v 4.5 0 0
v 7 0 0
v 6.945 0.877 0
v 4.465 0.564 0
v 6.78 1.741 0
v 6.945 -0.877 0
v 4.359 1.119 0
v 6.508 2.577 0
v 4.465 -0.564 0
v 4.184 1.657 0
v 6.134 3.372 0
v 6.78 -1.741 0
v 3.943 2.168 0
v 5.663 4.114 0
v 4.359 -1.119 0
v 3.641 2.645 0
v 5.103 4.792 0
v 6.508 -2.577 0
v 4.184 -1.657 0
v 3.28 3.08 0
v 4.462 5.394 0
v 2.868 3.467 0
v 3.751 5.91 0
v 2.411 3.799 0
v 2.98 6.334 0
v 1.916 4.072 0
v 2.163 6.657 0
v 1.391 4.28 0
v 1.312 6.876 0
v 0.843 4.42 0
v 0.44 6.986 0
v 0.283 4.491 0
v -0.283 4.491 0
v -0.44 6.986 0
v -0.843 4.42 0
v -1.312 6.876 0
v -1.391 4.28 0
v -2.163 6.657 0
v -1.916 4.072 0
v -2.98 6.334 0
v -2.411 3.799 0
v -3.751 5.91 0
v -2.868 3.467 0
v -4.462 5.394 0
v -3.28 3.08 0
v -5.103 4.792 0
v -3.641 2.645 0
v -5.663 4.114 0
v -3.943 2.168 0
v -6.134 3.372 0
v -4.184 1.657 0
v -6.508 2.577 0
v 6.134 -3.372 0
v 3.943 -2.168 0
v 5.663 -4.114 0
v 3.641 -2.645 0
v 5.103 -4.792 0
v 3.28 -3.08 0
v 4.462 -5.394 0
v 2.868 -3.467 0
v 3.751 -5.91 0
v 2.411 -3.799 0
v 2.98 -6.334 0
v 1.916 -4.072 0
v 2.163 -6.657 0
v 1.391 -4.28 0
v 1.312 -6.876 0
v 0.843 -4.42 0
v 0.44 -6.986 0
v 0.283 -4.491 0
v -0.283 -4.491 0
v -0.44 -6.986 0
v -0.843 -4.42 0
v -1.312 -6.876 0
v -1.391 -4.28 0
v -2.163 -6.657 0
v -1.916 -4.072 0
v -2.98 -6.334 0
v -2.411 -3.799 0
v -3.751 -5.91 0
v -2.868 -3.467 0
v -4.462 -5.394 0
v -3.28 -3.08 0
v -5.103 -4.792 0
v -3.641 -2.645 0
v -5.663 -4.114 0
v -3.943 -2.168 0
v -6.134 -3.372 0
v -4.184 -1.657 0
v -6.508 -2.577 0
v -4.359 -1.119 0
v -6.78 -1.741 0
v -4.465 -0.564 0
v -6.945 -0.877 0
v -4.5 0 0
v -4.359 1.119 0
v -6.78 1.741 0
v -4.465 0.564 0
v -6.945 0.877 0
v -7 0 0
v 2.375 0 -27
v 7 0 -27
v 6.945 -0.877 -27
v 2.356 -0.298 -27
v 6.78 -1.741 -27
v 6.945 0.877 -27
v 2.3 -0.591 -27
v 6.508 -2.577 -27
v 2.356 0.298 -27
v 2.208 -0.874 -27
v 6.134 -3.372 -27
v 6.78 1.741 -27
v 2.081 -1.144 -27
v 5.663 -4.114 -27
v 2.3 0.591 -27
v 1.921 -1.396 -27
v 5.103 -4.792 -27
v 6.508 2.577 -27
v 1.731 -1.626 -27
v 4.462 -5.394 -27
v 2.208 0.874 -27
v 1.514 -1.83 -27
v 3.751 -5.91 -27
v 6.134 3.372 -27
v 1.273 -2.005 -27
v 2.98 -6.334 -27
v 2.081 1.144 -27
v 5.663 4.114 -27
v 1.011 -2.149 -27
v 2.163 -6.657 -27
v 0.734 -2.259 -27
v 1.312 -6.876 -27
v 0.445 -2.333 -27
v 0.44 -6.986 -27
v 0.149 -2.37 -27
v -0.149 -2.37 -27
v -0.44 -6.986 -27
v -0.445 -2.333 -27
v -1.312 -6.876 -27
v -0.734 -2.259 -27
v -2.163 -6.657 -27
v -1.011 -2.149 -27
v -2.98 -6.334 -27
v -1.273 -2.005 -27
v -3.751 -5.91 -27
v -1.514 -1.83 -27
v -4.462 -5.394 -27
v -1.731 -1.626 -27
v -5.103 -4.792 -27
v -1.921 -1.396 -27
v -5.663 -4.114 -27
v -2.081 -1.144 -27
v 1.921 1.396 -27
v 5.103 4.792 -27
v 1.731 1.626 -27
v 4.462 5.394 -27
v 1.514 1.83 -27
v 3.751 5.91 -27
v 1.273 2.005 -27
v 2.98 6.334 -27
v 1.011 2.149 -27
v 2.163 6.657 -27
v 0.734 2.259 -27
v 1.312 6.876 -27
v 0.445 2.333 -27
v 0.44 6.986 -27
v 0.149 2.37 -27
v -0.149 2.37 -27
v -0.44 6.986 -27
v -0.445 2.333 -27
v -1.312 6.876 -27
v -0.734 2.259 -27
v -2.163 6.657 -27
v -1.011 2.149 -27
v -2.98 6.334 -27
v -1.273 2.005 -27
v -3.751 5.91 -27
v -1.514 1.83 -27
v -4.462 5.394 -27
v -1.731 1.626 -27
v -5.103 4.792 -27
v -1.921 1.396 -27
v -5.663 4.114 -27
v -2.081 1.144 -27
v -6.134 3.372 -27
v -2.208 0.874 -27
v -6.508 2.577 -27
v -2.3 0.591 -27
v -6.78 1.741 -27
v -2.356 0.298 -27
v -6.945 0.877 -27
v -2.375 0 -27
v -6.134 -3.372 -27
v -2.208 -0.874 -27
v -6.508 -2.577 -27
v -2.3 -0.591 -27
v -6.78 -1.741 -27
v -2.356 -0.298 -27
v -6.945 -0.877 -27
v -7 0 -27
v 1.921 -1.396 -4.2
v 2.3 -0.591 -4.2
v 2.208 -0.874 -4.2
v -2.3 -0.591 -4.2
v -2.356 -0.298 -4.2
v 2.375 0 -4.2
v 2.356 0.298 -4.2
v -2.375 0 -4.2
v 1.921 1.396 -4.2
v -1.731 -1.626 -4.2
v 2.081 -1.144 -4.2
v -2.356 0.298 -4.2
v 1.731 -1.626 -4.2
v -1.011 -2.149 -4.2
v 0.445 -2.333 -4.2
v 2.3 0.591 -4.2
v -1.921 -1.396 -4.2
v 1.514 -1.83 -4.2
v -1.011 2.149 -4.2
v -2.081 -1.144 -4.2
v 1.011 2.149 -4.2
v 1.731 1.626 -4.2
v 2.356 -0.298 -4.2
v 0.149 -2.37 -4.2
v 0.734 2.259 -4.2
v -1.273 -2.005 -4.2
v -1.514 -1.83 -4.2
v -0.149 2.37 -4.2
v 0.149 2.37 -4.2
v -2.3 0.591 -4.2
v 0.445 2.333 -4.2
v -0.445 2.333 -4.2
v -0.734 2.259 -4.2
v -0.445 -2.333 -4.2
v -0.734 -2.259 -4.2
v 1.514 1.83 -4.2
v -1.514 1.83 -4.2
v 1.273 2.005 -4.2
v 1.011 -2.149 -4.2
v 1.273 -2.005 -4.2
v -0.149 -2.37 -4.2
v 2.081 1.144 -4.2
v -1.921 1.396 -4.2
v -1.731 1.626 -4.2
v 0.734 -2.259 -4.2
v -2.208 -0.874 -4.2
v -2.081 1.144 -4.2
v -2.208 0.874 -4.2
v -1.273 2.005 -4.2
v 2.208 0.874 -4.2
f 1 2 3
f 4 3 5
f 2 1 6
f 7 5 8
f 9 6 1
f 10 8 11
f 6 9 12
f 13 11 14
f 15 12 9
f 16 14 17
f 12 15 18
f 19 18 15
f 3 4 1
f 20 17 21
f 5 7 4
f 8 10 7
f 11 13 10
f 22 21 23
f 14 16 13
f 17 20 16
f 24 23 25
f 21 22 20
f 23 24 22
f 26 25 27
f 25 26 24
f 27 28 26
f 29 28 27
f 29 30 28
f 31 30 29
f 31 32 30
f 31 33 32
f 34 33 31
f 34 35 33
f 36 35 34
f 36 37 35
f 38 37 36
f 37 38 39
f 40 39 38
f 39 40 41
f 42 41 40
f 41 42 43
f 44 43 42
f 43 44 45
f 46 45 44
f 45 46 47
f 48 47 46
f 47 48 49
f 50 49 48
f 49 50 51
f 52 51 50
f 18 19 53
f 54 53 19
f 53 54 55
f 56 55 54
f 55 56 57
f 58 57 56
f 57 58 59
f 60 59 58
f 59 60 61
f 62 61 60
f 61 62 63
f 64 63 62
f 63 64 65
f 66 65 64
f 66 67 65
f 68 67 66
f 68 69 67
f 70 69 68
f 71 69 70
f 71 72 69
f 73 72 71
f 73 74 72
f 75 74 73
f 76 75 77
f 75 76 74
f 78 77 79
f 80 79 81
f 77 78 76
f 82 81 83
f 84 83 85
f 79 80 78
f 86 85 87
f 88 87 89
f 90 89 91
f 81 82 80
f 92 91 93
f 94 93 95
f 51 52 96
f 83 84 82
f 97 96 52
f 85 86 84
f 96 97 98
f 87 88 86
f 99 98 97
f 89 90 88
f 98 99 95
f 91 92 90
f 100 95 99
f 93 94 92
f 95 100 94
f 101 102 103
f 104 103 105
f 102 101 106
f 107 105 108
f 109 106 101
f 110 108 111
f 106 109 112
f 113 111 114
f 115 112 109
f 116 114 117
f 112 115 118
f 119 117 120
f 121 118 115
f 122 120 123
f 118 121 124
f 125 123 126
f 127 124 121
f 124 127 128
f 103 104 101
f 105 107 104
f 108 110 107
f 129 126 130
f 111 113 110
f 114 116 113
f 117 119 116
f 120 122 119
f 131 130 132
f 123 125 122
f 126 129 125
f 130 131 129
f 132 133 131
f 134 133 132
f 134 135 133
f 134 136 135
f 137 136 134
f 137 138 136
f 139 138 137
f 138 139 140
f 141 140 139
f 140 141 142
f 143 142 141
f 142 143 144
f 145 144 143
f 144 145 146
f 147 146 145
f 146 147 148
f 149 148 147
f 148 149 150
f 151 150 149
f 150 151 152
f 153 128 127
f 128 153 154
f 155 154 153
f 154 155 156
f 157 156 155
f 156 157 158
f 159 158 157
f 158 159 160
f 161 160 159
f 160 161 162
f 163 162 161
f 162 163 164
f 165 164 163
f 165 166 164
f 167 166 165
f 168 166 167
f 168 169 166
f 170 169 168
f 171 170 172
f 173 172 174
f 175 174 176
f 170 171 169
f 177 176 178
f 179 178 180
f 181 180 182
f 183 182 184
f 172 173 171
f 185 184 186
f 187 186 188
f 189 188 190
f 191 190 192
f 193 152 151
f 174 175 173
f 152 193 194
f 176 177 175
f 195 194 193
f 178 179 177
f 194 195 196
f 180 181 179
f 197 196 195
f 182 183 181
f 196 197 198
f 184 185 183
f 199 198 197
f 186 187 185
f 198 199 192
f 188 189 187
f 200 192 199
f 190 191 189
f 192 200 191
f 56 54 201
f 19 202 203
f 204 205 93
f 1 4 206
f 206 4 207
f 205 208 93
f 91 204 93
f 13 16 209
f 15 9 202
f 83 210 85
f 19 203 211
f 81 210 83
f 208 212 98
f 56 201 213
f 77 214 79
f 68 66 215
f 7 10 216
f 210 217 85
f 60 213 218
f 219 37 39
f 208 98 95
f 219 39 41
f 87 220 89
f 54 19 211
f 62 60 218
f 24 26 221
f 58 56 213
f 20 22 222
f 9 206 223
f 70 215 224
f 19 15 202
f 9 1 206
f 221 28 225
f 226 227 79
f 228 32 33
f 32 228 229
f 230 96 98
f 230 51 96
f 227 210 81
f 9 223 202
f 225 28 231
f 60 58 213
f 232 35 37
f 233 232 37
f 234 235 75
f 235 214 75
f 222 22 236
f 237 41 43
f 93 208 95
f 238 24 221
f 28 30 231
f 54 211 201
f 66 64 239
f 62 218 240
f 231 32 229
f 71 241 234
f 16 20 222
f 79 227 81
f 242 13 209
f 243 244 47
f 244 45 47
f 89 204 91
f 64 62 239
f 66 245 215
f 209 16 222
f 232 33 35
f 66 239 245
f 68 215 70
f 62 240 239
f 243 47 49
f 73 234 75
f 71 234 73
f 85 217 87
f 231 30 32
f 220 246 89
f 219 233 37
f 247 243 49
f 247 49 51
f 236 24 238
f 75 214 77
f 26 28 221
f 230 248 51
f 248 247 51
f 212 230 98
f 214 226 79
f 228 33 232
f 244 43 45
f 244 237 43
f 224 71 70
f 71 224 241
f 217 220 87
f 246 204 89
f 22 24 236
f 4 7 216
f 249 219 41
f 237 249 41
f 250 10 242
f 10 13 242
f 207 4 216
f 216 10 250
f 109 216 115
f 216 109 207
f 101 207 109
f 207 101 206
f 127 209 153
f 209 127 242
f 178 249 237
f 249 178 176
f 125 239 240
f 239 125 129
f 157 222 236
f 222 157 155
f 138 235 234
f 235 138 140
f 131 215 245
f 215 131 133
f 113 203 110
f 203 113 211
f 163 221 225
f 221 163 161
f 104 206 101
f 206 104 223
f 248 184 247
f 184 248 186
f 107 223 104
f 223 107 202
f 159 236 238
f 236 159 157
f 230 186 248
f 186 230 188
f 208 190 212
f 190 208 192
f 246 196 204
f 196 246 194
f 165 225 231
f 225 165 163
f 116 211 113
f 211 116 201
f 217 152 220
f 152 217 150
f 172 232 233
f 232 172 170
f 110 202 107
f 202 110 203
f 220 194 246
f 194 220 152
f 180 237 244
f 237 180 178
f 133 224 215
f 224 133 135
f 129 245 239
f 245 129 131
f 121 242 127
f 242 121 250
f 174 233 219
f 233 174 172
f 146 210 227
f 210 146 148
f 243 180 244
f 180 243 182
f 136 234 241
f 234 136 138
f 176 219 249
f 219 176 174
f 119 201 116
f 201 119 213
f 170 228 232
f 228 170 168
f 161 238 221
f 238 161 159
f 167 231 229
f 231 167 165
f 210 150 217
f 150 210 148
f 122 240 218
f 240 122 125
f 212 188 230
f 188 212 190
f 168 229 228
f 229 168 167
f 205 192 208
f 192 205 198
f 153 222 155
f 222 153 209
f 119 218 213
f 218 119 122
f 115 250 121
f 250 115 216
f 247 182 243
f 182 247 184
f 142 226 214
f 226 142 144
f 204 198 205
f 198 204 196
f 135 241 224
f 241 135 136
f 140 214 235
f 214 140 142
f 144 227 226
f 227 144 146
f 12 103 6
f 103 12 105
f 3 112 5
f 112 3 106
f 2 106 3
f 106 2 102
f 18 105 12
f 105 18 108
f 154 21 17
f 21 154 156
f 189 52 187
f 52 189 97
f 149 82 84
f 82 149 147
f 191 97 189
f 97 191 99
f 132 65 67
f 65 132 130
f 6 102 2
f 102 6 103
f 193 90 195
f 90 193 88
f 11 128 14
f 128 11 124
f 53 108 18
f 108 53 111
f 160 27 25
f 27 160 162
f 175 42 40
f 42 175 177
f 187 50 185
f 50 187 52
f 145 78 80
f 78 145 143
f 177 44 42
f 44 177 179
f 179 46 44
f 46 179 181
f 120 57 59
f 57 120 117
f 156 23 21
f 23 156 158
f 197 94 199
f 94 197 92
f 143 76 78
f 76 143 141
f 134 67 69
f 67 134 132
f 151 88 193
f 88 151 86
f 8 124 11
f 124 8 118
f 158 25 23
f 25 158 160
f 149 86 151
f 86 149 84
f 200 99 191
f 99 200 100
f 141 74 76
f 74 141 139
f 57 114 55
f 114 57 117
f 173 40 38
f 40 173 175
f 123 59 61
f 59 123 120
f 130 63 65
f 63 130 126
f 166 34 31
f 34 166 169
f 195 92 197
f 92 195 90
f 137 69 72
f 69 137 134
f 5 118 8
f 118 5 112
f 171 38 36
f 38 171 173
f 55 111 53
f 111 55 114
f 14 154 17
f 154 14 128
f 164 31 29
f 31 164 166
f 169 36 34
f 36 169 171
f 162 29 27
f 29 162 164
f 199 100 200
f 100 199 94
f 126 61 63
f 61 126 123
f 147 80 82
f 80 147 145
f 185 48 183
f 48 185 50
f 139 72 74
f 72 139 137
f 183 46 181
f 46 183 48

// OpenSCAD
$fn = 50;


difference() {
	union() {
		translate(v = [0, 0, -27.0000000000]) {
			cylinder(h = 27, r = 7.0000000000);
		}
		cylinder(h = 0, r = 16.0000000000);
	}
	union() {
		translate(v = [0, 0, 0]) {
			rotate(a = [0, 0, 0]) {
				difference() {
					union() {
						#translate(v = [0, 0, -27.0000000000]) {
							cylinder(h = 27, r = 2.2500000000);
						}
						#translate(v = [0, 0, -4.2000000000]) {
							cylinder(h = 4.2000000000, r1 = 2.3750000000, r2 = 4.5000000000);
						}
						#translate(v = [0, 0, -27.0000000000]) {
							cylinder(h = 27, r = 2.3750000000);
						}
						#translate(v = [0, 0, -27.0000000000]) {
							cylinder(h = 27, r = 2.2500000000);
						}
					}
					union();
				}
			}
		}
	}
}
